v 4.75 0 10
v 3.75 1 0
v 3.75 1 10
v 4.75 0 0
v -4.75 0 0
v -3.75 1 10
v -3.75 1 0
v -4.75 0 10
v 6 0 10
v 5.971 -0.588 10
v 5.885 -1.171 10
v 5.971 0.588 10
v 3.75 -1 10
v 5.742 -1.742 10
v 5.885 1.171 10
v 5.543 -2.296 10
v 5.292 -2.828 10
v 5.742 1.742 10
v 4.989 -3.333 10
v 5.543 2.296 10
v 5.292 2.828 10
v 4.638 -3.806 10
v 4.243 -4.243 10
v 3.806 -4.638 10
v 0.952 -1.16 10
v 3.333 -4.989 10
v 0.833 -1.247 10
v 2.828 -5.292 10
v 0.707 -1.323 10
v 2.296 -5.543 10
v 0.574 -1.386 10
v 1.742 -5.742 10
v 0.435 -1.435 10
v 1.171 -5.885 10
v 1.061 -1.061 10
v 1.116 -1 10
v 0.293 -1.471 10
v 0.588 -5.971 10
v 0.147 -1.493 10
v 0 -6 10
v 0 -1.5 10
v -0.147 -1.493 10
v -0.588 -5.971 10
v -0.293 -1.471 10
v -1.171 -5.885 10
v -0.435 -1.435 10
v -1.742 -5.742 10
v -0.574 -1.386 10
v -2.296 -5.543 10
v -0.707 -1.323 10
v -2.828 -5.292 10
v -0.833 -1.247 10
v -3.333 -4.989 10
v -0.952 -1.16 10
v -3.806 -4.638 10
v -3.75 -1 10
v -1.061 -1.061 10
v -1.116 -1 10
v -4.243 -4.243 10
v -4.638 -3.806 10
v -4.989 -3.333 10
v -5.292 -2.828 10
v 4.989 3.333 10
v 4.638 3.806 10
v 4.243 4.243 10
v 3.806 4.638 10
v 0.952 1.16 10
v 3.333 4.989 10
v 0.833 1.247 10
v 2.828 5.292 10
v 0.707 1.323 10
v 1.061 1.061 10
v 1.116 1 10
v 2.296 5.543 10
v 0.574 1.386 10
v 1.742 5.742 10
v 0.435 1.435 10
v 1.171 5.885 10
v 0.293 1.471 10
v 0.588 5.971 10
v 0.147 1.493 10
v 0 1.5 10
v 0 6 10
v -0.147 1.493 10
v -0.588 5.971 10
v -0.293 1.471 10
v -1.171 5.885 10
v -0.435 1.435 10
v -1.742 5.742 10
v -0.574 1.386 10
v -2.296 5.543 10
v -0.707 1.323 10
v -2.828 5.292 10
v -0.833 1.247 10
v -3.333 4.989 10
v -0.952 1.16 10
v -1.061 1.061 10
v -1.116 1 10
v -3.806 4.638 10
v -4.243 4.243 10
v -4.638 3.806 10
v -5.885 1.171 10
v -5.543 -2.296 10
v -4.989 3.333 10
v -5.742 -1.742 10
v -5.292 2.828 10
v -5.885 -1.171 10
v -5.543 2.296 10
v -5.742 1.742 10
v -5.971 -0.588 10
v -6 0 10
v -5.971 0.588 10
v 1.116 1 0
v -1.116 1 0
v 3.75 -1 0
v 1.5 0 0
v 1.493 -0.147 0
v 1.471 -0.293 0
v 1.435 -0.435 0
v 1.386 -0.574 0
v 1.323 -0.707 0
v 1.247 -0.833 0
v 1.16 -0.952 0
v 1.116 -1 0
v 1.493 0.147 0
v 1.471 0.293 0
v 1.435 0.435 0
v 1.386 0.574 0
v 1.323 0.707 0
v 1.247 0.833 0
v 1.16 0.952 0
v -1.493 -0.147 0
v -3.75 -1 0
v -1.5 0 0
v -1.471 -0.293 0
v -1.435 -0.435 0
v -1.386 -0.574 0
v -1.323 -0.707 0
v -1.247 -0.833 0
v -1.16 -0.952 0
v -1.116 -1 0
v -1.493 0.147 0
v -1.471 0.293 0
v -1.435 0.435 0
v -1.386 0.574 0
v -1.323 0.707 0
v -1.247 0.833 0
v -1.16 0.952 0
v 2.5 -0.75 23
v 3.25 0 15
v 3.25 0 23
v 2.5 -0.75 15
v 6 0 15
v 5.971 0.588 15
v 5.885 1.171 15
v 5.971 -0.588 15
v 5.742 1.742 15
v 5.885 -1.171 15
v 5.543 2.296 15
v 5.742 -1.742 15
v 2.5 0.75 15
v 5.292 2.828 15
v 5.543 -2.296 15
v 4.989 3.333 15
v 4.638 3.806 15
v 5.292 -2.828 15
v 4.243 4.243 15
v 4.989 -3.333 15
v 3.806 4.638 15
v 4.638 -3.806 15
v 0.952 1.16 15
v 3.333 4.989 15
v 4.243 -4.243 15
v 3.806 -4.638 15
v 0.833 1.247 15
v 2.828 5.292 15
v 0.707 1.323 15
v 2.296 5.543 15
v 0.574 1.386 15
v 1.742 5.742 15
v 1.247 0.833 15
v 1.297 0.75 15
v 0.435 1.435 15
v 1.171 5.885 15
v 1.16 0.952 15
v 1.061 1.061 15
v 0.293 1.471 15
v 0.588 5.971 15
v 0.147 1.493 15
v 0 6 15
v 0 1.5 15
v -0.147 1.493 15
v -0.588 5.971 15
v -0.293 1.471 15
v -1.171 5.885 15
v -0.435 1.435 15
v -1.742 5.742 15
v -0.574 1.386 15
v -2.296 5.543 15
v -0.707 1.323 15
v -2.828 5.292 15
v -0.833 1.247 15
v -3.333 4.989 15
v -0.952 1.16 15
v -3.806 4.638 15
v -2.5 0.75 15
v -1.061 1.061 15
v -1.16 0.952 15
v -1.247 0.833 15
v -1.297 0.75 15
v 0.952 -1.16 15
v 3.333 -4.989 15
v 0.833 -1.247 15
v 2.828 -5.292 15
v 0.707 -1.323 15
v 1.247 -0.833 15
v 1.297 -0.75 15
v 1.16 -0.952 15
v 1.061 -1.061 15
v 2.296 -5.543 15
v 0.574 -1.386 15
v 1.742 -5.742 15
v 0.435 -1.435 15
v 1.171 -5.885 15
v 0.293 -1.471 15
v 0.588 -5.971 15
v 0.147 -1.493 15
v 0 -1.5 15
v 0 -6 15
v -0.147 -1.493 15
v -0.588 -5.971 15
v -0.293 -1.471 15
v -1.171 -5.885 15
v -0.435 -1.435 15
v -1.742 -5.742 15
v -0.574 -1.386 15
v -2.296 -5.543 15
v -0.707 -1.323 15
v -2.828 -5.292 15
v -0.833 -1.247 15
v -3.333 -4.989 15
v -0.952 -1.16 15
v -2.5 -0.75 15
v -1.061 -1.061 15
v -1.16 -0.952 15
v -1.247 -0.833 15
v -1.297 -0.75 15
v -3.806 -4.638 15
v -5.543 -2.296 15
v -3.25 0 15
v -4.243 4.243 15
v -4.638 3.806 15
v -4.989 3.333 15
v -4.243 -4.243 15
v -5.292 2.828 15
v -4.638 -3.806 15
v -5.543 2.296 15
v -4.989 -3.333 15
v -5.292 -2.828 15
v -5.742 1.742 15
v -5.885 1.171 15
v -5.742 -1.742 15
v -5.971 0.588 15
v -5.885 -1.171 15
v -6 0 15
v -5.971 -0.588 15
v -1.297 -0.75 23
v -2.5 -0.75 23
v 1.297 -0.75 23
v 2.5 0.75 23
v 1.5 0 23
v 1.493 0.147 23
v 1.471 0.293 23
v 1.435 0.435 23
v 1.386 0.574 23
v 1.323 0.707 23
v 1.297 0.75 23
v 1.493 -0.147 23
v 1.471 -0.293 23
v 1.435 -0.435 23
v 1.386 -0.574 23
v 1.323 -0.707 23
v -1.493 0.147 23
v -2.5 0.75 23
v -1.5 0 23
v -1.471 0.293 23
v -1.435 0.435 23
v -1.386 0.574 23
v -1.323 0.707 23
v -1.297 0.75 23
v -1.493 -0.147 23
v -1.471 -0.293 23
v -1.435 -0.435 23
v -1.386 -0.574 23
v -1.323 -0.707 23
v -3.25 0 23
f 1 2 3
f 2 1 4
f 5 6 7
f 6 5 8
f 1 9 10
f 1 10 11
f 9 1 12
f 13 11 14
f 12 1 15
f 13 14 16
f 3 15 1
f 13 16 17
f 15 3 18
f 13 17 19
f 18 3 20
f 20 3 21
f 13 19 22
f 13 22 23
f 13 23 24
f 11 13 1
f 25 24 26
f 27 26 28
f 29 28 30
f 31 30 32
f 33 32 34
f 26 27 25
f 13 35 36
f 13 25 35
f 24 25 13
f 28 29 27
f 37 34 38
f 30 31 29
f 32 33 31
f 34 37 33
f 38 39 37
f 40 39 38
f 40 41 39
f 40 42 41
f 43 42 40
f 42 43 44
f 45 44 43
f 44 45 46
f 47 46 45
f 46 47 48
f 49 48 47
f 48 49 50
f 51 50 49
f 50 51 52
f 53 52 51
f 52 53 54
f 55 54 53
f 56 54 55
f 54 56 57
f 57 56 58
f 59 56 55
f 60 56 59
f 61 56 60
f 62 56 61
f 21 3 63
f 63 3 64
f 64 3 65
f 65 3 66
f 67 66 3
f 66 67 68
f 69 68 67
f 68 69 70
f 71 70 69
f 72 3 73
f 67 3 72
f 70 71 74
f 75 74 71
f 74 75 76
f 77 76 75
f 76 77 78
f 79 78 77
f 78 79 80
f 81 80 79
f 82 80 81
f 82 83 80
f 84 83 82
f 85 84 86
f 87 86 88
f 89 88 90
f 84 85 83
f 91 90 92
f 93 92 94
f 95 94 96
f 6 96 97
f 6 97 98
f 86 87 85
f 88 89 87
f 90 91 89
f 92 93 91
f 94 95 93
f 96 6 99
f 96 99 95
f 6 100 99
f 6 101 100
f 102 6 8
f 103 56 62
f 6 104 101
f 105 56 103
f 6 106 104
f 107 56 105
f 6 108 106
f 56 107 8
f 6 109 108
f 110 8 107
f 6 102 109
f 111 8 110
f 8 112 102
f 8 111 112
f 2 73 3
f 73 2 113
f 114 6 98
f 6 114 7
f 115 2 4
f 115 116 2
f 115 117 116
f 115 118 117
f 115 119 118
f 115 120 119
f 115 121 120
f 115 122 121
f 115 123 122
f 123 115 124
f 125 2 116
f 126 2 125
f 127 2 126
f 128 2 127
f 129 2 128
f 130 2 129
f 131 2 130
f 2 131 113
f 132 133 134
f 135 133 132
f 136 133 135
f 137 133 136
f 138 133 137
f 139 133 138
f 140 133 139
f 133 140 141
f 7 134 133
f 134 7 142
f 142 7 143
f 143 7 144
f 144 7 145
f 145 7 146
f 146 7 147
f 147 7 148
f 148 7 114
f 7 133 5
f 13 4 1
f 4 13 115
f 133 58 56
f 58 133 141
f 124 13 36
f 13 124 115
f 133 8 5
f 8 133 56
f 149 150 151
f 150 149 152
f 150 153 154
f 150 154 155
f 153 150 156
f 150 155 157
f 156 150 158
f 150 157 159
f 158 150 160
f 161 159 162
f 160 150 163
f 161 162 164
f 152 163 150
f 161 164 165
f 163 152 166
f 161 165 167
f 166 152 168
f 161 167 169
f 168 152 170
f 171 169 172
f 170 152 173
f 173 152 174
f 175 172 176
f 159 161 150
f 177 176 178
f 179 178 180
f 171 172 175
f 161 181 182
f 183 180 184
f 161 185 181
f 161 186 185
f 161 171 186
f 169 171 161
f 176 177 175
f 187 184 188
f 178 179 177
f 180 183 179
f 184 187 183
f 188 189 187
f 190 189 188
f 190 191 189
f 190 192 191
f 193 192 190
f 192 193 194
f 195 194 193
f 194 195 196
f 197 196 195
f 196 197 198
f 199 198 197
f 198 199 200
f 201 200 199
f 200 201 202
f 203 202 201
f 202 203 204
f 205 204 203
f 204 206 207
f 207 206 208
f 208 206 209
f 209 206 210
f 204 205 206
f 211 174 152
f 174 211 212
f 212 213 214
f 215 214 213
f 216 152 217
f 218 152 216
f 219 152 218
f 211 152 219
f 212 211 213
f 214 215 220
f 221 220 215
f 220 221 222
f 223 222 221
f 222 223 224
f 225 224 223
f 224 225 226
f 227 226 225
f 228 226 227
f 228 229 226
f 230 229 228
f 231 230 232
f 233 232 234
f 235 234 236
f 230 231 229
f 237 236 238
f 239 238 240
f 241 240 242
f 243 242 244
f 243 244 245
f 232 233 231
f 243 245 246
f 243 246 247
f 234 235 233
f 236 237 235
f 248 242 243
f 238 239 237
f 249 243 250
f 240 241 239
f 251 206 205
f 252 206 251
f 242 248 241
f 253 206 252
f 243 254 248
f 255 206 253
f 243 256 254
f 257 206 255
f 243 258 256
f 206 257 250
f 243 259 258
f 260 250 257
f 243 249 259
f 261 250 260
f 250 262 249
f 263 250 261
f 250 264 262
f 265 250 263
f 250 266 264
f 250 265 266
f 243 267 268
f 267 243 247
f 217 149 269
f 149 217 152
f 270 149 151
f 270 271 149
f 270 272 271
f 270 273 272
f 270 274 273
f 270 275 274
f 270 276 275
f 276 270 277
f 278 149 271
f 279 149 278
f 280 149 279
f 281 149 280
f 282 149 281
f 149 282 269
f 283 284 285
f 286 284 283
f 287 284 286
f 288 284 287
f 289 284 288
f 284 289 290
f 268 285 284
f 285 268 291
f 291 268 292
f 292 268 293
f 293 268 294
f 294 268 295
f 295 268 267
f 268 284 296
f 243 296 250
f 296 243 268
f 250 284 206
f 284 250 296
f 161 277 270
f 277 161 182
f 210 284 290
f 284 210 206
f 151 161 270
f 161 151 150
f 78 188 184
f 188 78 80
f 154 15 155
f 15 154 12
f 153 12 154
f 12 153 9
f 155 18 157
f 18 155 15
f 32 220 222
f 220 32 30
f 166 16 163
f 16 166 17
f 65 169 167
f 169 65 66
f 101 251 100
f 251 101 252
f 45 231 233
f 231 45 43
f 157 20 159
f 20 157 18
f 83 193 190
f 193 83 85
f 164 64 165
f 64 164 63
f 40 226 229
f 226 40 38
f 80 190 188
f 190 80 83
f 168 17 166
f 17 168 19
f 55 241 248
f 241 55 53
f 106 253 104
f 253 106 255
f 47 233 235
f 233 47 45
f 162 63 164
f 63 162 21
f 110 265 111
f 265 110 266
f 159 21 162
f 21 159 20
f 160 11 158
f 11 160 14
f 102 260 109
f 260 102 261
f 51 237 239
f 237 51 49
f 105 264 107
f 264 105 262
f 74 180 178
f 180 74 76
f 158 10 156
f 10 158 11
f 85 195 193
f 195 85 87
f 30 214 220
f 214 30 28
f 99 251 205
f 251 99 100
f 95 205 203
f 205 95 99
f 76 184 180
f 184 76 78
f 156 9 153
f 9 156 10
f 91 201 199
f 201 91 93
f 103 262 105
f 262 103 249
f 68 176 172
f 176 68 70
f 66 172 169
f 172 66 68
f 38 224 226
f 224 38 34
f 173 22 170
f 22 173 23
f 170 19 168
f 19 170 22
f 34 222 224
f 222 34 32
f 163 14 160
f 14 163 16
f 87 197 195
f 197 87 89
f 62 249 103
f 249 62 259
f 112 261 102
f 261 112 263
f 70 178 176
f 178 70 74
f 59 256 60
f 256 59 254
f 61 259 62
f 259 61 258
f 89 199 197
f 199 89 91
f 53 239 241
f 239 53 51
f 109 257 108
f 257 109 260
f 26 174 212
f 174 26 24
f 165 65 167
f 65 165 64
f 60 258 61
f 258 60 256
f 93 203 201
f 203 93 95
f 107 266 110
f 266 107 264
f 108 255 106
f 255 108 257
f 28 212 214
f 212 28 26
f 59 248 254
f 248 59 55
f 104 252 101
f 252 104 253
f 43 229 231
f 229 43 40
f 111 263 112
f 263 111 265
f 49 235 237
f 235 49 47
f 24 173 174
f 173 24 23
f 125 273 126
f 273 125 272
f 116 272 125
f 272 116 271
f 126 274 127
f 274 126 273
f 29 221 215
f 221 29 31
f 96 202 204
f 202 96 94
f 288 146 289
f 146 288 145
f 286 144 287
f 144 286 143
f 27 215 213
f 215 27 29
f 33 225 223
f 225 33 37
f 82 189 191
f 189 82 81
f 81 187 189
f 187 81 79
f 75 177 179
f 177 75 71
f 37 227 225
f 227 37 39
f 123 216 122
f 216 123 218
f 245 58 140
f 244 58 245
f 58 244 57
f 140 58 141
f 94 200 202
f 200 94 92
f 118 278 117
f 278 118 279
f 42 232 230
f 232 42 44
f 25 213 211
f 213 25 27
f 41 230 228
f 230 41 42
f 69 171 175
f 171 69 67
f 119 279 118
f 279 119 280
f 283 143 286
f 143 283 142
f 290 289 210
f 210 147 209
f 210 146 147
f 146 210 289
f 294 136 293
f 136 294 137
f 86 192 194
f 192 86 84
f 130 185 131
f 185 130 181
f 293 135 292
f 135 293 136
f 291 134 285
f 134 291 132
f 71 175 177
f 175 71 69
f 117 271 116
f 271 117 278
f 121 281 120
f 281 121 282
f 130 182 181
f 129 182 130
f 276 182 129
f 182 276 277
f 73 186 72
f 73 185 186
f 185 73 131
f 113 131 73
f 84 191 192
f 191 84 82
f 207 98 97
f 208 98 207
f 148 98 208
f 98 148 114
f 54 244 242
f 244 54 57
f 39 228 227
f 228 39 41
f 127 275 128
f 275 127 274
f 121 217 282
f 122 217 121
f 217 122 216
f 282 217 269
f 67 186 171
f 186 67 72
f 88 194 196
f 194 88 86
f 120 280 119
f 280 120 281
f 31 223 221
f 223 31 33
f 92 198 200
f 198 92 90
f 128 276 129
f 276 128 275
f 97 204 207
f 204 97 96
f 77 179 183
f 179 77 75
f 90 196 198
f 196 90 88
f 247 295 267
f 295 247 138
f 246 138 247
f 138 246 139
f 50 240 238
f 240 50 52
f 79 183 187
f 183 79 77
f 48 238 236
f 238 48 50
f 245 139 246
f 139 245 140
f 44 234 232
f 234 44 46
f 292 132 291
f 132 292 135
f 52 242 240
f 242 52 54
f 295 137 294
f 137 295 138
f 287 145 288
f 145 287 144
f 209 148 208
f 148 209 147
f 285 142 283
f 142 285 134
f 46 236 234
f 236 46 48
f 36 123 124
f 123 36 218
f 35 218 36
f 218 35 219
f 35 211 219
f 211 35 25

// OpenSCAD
// Straight hose-barb reducer: 8 mm tubing (barbs) -> 5 mm tubing (barbs)
// Print orientation: standing upright along Z, centred on origin in X/Y

$fn = 64;

// ---- Dimensions (mm) ----
bore      = 3;    // central through-bore diameter
barb8_h   = 10;   // height of each 8 mm barb
barb8_od  = 7.5;  // outer diameter of 8 mm barb at bottom (z = 0)
barb8_top = 9.5;  // outer diameter of 8 mm barb at top (z = 10)
collar_d  = 12;   // diameter of cylindrical collar
collar_h  = 5;    // height of collar (z = 20 to 25)
barb5_h   = 8;    // height of each 5 mm barb
barb5_od  = 6.5;  // outer diameter of 5 mm barb at bottom (z = 25)
barb5_top = 5.0;  // outer diameter of 5 mm barb at top (z = 33)
overlap   = 0.5;  // overlap/extension for clean boolean cuts

total_h = barb8_h + collar_h + barb5_h;  // 23 mm overall

// ---- Model ----
difference() {
    union() {
        // Lower section: two stacked 8 mm barbs (sawtooth profile)
        for (s = [-1, 1])
            translate([0, 0, 0])
                linear_extrude(height = barb8_h)
                    polygon(points = [
                        [-barb8_od / 2, s * (barb8_od - barb8_top) / 2],
                        [ barb8_od / 2, s * (barb8_od - barb8_top) / 2],
                        [ barb8_top / 2, s * 0],
                        [-barb8_top / 2, s * 0]
                    ]);

        // Collar
        translate([0, 0, barb8_h])
            cylinder(d = collar_d, h = collar_h);

        // Upper section: two stacked 5 mm barbs (shrinking profile)
        for (s = [-1, 1])
            translate([0, 0, barb8_h + collar_h])
                linear_extrude(height = barb5_h)
                    polygon(points = [
                        [-barb5_od / 2, s * 0],
                        [ barb5_od / 2, s * 0],
                        [ barb5_top / 2, s * (barb5_od - barb5_top) / 2],
                        [-barb5_top / 2, s * (barb5_od - barb5_top) / 2]
                    ]);
    }

    // Central through-bore
    translate([0, 0, -overlap])
        cylinder(d = bore, h = total_h + 2 * overlap);
}
